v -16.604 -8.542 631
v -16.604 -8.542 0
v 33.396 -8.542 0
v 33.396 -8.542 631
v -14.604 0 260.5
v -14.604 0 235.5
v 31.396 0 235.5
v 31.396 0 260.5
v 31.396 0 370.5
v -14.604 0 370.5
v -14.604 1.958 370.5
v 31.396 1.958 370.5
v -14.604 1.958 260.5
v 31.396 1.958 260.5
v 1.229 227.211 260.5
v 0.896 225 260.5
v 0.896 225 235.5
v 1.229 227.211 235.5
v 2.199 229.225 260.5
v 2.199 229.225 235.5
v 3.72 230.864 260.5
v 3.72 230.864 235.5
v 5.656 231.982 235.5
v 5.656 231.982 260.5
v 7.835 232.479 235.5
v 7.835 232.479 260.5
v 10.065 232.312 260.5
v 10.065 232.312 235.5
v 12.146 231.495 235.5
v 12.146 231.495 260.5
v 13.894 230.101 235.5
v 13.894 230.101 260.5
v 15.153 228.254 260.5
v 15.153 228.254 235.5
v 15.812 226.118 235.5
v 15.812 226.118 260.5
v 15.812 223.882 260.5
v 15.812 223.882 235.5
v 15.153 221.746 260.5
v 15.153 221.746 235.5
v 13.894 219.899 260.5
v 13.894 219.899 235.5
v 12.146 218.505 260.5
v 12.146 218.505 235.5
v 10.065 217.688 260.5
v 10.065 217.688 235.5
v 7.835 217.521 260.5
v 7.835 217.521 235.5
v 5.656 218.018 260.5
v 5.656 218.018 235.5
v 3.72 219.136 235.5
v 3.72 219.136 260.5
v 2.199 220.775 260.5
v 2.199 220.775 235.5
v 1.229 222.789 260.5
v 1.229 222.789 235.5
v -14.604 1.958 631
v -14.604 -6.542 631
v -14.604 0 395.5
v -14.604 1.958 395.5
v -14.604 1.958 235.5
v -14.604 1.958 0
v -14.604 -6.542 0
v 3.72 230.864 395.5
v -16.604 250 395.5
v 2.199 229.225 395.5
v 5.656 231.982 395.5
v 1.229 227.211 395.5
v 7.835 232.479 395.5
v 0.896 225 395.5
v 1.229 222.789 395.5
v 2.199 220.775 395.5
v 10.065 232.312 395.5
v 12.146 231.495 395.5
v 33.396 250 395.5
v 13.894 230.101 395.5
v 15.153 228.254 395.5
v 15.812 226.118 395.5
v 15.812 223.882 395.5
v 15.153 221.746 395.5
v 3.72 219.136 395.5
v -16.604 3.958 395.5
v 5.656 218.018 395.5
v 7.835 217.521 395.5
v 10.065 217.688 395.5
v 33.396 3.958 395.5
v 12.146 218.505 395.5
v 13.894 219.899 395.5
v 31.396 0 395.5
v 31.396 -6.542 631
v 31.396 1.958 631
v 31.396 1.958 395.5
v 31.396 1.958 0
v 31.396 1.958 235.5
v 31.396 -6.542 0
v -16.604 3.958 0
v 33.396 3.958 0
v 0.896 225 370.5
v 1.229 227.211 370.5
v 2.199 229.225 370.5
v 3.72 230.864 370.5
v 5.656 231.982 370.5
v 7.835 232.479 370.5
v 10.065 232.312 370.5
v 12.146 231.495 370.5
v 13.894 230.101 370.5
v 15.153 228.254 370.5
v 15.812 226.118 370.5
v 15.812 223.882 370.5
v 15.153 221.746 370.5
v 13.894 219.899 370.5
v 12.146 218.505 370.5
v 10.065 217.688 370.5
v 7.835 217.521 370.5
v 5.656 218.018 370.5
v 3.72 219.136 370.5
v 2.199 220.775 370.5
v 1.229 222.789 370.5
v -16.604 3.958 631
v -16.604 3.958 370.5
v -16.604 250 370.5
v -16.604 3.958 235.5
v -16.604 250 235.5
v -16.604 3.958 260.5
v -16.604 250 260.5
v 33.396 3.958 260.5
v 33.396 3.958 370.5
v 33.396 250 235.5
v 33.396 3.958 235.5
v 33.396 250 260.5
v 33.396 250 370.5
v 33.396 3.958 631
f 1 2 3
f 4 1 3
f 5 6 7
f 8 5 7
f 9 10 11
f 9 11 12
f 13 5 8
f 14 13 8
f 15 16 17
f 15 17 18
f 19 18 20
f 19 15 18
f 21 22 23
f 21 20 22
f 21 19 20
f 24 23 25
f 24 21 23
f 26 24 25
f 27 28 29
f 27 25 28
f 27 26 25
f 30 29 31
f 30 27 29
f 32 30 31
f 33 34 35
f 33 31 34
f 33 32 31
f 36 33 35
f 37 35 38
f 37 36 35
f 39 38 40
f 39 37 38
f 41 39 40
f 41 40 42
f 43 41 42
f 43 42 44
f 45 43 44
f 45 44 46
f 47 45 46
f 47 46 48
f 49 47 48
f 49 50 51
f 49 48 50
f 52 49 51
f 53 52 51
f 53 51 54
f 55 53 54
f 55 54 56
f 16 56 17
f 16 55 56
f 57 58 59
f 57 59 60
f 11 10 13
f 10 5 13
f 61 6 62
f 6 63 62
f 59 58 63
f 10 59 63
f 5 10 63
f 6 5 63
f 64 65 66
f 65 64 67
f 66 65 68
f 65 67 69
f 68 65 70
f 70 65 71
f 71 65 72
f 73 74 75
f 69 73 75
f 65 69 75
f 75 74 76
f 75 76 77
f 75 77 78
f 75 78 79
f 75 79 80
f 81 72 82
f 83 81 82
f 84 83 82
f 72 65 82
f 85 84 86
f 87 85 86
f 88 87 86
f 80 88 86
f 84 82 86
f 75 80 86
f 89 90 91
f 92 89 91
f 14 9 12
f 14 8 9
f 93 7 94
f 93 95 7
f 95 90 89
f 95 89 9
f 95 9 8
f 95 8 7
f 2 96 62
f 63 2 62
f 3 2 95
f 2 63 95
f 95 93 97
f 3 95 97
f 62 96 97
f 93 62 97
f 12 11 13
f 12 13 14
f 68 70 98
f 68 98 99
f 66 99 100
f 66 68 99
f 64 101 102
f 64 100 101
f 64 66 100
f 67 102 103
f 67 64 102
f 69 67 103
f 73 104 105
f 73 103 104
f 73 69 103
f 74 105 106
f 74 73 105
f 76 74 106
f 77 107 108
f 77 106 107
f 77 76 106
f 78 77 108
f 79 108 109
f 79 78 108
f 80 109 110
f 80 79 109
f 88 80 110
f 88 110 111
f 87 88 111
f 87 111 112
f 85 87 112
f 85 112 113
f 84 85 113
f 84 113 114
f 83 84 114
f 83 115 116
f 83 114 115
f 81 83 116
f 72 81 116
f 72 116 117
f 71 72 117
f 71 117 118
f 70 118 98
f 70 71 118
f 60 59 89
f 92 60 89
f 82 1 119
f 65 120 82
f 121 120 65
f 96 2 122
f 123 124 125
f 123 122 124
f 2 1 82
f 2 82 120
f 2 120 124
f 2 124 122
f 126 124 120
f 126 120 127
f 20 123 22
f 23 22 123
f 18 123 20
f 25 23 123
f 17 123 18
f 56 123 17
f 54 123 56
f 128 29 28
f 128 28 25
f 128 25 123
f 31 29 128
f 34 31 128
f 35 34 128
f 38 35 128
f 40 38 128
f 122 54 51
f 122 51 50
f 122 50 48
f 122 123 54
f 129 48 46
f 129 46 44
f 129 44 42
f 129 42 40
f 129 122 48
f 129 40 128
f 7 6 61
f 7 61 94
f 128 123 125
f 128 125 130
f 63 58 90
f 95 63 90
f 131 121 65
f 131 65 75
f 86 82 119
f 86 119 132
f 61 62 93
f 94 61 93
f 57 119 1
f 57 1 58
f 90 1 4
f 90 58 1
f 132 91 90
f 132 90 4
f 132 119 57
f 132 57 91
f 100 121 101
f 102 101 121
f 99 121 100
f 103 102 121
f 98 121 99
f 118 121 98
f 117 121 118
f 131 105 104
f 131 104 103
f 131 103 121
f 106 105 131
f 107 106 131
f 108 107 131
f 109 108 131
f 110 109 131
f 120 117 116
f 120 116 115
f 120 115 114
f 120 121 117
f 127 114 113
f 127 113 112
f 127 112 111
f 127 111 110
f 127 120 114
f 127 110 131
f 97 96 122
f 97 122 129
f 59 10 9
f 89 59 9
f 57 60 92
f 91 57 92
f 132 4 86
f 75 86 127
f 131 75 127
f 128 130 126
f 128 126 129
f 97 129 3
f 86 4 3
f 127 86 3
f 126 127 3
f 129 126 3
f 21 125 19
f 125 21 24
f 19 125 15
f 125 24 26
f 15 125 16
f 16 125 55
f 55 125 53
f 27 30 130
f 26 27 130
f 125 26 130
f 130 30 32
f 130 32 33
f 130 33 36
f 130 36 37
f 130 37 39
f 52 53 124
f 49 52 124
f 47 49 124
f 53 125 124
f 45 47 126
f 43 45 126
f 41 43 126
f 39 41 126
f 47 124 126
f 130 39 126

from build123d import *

# Parameters (mm, degrees)
SKETCH1_W               = 50
SKETCH1_H               = 12.499999892
BOSS_EXTRUDE1_DEPTH     = 631
SHELL1_T                = -2
SKETCH3_W               = 50
SKETCH3_H               = 25
BOSS_EXTRUDE2_DEPTH     = 250
CUT_EXTRUDE1_DEPTH      = 470.079458784
CUT_EXTRUDE1_DEPTH_BACK = 470.079458784
SKETCH4_R               = 7.5


with BuildPart() as part:
    # Sketch1 → Boss-Extrude1 (new body)
    with BuildSketch(Plane.XY):
        with Locations((8.395937674, -2.291666613)):
            Rectangle(SKETCH1_W, SKETCH1_H)
    extrude(amount=BOSS_EXTRUDE1_DEPTH)

    # Shell1
    shell1_openings = [part.faces().sort_by_distance(p)[0] for p in [
        (8.395937674, -2.291666613, 631),
        (8.395937674, -2.291666613, 0),
    ]]
    offset(amount=SHELL1_T, openings=shell1_openings, kind=Kind.INTERSECTION)

    # Sketch3 → Boss-Extrude2 (add)
    with BuildSketch(Plane(origin=(0, 0, 0), x_dir=(1, 0, 0), z_dir=(0, 1, 0))):
        with Locations((8.395937674, -248)):
            Rectangle(SKETCH3_W, SKETCH3_H)
        with Locations((8.395937674, -383)):
            Rectangle(SKETCH3_W, SKETCH3_H)
    extrude(amount=BOSS_EXTRUDE2_DEPTH)

    # Sketch4 → Cut-Extrude1 (cut, two sides: drawn at the far end of the back side and taken through both)
    with BuildSketch(Plane(origin=(0, 0, 235.5), x_dir=(-1, 0, 0), z_dir=(0, 0, -1)).offset(-CUT_EXTRUDE1_DEPTH_BACK)):
        with Locations((-8.395937674, 225)):
            Circle(SKETCH4_R)
    extrude(amount=CUT_EXTRUDE1_DEPTH + CUT_EXTRUDE1_DEPTH_BACK, mode=Mode.SUBTRACT)


solid = part.part
